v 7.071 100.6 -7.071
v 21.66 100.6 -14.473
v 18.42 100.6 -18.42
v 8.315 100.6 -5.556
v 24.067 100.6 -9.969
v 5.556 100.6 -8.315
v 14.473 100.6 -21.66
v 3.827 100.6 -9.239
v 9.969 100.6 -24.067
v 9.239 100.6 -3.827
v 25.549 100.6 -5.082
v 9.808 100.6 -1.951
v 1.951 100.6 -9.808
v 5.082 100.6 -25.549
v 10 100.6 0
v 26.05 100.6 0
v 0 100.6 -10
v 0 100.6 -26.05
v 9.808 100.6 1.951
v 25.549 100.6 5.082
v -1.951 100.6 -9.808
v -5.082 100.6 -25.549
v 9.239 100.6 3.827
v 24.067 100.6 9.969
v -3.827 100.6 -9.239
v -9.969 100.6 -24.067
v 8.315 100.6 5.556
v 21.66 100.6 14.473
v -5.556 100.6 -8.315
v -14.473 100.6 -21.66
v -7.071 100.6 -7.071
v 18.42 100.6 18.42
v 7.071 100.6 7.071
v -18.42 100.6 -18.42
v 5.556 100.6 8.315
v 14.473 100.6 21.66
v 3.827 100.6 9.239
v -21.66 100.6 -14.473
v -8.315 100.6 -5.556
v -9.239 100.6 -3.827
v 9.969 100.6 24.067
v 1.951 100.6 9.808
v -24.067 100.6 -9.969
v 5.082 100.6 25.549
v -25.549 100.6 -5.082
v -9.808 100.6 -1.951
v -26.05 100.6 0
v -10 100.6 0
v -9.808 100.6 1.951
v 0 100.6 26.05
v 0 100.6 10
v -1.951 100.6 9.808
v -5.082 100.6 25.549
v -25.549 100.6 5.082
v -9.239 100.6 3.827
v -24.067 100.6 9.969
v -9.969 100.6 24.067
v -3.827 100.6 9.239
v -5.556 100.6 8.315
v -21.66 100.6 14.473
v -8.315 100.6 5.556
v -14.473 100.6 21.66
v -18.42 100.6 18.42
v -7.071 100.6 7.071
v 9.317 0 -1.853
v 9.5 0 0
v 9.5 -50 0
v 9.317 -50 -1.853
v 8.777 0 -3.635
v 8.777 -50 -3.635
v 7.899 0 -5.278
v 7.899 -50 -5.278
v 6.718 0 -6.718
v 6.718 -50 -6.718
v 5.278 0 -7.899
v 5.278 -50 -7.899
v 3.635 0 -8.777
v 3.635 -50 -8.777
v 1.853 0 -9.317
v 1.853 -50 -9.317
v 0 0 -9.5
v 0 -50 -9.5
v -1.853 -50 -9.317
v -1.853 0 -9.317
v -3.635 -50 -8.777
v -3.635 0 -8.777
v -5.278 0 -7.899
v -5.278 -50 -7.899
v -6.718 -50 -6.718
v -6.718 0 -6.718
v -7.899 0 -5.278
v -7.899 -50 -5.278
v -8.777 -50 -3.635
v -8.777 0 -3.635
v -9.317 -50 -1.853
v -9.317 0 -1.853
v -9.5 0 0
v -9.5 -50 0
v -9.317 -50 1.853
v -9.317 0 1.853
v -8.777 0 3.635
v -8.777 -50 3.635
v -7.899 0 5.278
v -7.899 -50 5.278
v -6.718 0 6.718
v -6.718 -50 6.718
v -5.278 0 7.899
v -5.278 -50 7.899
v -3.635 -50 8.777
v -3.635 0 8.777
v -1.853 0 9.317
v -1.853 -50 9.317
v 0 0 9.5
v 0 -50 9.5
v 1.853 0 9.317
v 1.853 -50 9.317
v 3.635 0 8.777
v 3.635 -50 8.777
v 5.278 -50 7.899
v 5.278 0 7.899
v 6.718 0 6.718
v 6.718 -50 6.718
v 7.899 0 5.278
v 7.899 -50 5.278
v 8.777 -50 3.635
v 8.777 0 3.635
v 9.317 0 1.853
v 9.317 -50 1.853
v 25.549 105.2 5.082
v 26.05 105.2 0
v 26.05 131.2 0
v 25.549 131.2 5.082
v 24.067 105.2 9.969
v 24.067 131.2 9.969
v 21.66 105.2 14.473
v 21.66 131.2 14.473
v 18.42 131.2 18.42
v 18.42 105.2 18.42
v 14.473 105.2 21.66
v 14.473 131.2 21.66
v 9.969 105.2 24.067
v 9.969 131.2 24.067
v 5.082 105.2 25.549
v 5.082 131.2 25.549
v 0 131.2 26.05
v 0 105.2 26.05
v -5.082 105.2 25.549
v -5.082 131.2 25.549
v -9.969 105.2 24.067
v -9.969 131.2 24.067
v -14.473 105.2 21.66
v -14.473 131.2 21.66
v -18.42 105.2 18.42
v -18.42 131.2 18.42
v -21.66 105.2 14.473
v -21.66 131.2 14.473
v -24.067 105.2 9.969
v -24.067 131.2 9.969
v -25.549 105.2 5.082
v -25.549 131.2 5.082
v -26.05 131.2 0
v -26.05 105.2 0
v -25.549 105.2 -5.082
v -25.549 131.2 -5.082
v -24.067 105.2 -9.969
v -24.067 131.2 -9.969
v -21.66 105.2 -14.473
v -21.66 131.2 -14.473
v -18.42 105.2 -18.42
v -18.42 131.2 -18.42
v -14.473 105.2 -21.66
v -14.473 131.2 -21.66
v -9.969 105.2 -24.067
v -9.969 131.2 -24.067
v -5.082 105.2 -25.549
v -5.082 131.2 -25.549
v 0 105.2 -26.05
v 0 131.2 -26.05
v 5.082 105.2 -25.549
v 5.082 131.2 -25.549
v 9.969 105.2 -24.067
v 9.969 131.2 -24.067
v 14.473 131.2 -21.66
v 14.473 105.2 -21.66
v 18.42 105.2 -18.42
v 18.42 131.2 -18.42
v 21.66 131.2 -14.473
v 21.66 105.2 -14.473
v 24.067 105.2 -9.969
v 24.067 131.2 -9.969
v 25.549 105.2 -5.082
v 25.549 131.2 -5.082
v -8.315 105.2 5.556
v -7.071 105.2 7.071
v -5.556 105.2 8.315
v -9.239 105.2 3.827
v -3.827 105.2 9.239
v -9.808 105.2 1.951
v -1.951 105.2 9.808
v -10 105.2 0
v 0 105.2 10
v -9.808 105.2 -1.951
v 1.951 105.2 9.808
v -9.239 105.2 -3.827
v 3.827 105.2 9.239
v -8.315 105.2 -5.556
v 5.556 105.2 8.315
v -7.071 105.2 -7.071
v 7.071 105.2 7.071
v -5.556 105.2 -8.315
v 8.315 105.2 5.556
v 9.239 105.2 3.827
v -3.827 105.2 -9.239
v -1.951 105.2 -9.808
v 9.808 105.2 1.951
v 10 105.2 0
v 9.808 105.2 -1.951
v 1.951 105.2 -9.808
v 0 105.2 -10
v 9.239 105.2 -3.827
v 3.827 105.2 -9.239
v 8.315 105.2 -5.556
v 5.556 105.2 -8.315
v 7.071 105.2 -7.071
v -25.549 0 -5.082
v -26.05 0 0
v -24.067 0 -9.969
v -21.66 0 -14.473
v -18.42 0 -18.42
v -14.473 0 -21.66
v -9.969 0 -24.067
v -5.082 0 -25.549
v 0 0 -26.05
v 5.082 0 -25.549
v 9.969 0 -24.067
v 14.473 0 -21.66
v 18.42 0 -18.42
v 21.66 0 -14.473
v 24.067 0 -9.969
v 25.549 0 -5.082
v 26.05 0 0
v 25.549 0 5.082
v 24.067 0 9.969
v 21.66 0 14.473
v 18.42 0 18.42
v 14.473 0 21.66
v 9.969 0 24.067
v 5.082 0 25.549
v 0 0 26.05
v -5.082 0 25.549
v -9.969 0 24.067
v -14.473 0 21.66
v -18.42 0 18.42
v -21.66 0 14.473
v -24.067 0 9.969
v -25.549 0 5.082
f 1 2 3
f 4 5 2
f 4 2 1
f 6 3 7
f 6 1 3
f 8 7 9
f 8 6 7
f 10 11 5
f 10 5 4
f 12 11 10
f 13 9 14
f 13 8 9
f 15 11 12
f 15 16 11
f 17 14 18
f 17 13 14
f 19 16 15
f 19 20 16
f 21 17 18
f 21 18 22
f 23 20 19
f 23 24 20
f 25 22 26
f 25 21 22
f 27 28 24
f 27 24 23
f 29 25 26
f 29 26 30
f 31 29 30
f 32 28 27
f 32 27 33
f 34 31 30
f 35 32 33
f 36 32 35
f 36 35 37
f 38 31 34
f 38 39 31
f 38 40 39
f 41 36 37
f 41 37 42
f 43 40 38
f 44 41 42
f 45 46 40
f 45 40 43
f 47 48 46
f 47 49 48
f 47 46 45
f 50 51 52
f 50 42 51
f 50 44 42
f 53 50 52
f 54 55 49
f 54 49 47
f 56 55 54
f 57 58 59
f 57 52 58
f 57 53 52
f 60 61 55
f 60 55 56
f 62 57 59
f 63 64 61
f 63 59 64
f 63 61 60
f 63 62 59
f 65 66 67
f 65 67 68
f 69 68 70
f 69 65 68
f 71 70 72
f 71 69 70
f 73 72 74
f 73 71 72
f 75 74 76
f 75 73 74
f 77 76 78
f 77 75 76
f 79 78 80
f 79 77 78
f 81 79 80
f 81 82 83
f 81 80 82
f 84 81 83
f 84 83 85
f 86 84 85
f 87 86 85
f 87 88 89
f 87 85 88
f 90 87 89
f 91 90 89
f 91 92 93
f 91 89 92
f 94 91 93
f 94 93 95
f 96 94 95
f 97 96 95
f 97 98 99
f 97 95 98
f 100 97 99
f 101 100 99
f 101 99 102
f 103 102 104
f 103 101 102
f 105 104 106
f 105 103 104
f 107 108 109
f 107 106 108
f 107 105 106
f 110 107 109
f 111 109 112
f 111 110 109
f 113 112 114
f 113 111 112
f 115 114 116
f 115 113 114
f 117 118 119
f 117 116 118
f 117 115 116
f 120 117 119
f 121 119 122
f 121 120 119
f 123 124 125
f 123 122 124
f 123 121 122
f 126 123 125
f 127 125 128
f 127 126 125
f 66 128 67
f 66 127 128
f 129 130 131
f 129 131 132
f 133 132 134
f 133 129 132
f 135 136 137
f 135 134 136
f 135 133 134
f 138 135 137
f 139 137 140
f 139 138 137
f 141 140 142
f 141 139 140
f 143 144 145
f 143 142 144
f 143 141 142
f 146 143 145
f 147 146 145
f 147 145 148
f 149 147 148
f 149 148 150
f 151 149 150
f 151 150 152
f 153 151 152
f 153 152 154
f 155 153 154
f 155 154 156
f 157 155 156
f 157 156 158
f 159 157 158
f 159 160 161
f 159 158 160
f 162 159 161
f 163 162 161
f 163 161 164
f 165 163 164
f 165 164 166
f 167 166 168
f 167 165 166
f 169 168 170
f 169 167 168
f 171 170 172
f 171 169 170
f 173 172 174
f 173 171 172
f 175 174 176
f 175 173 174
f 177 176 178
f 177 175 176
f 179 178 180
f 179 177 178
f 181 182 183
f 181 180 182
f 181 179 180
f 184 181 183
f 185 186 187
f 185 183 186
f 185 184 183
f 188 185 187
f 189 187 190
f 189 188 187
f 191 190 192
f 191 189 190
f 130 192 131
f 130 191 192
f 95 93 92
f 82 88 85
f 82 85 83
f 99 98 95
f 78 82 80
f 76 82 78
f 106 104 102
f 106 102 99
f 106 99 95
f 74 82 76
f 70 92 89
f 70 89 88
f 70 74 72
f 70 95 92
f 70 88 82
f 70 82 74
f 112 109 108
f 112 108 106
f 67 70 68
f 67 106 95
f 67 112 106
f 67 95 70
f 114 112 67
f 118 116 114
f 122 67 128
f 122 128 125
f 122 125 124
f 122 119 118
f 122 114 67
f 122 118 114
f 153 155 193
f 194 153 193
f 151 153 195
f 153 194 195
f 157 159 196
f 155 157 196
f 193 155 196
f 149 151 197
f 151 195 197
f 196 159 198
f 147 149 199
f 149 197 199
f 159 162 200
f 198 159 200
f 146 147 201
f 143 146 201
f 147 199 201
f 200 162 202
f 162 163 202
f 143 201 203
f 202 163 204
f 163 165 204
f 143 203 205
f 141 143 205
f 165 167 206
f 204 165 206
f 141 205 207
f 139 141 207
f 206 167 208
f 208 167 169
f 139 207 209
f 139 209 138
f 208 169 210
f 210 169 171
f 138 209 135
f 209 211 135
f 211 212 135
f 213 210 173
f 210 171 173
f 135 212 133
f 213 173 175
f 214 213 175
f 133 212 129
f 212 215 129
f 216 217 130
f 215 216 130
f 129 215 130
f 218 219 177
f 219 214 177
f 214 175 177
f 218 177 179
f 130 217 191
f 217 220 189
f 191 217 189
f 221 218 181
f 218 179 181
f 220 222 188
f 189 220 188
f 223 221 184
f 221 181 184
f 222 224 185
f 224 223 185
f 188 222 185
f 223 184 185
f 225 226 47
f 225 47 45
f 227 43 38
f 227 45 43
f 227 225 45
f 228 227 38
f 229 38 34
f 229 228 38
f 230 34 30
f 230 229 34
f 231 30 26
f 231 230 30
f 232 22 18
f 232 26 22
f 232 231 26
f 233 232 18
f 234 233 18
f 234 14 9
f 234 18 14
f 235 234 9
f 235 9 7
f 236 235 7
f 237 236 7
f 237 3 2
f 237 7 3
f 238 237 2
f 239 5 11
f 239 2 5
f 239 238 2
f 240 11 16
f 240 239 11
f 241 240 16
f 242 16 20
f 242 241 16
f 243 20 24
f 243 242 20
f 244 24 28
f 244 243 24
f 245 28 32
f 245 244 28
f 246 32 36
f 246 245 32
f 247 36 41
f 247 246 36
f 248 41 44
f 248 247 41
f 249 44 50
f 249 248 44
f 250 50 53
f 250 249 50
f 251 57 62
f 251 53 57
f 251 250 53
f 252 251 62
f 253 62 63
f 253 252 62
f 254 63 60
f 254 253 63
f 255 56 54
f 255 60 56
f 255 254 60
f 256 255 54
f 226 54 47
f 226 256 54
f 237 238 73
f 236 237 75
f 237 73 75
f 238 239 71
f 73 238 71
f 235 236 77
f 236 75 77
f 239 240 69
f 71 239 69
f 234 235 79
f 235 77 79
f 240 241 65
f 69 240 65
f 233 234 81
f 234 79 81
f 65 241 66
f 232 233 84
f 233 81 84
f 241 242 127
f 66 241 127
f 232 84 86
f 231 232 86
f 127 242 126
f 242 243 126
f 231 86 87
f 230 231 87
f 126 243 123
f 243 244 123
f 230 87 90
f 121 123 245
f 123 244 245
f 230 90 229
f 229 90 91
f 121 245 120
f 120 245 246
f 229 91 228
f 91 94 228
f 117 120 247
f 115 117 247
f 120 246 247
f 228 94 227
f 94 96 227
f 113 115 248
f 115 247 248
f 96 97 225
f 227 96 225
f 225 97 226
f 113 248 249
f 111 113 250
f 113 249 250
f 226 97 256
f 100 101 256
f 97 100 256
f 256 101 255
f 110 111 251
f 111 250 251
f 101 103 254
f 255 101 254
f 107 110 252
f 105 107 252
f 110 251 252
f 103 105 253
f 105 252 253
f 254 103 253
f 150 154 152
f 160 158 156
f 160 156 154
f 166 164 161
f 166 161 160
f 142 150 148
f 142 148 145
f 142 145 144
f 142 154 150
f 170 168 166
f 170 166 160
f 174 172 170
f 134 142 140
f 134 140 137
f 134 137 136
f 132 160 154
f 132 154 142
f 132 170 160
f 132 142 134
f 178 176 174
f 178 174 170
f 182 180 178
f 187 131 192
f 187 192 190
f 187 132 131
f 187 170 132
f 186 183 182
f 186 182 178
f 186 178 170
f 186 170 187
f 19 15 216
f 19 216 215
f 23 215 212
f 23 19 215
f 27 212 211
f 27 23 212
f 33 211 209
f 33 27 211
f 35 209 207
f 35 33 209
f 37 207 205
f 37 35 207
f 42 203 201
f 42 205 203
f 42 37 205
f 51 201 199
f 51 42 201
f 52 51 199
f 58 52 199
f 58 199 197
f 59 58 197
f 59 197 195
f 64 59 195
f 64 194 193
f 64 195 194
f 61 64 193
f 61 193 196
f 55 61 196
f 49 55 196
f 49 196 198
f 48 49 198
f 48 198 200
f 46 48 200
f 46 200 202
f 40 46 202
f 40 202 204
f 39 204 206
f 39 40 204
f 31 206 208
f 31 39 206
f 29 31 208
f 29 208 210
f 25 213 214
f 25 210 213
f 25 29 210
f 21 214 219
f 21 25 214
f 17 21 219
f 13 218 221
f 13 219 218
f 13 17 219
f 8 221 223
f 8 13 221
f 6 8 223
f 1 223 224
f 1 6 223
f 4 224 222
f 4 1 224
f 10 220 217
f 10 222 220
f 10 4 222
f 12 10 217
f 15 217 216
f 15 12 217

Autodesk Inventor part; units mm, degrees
ref_plane "YZ Plane" through (0, 0, 0) normal (1, 0, 0) x (0, 1, 0)
ref_plane "XZ Plane" through (0, 0, 0) normal (0, 1, 0) x (-1, 0, 0)
ref_plane "XY Plane" through (0, 0, 0) normal (0, 0, 1) x (1, 0, 0)
sketch "Sketch1" plane through (0, 0, 0) normal (0, 1, 0) x (-1, 0, 0)
  circle A0 centre (0, 0) radius 26.05
  dimension "d0" = 52.1
extrude "Extrusion1" add sketch "Sketch1" along normal blind 100.6
sketch "Sketch2" plane through (0, 100.6, 0) normal (0, 1, 0) x (1, 0, 0)
  circle A0 centre (0, 0) radius 10
  dimension "d3" = 20
extrude "Extrusion2" add sketch "Sketch2" along normal blind 4.6
sketch "Sketch3" plane through (0, 105.2, 0) normal (0, 1, 0) x (1, 0, 0)
  circle A0 centre (0, 0) radius 10 projected
  circle A1 centre (0, 0) radius 26.05 projected
extrude "Extrusion3" add sketch "Sketch3" along normal blind 26 contours A0 | A1
sketch "Sketch4" plane through (0, 0, 0) normal (0, -1, 0) x (1, 0, 0)
  circle A0 centre (0, 0) radius 9.5
  dimension "d8" = 19
extrude "Extrusion4" add sketch "Sketch4" along normal blind 50
properties part number "SPINDLE"
